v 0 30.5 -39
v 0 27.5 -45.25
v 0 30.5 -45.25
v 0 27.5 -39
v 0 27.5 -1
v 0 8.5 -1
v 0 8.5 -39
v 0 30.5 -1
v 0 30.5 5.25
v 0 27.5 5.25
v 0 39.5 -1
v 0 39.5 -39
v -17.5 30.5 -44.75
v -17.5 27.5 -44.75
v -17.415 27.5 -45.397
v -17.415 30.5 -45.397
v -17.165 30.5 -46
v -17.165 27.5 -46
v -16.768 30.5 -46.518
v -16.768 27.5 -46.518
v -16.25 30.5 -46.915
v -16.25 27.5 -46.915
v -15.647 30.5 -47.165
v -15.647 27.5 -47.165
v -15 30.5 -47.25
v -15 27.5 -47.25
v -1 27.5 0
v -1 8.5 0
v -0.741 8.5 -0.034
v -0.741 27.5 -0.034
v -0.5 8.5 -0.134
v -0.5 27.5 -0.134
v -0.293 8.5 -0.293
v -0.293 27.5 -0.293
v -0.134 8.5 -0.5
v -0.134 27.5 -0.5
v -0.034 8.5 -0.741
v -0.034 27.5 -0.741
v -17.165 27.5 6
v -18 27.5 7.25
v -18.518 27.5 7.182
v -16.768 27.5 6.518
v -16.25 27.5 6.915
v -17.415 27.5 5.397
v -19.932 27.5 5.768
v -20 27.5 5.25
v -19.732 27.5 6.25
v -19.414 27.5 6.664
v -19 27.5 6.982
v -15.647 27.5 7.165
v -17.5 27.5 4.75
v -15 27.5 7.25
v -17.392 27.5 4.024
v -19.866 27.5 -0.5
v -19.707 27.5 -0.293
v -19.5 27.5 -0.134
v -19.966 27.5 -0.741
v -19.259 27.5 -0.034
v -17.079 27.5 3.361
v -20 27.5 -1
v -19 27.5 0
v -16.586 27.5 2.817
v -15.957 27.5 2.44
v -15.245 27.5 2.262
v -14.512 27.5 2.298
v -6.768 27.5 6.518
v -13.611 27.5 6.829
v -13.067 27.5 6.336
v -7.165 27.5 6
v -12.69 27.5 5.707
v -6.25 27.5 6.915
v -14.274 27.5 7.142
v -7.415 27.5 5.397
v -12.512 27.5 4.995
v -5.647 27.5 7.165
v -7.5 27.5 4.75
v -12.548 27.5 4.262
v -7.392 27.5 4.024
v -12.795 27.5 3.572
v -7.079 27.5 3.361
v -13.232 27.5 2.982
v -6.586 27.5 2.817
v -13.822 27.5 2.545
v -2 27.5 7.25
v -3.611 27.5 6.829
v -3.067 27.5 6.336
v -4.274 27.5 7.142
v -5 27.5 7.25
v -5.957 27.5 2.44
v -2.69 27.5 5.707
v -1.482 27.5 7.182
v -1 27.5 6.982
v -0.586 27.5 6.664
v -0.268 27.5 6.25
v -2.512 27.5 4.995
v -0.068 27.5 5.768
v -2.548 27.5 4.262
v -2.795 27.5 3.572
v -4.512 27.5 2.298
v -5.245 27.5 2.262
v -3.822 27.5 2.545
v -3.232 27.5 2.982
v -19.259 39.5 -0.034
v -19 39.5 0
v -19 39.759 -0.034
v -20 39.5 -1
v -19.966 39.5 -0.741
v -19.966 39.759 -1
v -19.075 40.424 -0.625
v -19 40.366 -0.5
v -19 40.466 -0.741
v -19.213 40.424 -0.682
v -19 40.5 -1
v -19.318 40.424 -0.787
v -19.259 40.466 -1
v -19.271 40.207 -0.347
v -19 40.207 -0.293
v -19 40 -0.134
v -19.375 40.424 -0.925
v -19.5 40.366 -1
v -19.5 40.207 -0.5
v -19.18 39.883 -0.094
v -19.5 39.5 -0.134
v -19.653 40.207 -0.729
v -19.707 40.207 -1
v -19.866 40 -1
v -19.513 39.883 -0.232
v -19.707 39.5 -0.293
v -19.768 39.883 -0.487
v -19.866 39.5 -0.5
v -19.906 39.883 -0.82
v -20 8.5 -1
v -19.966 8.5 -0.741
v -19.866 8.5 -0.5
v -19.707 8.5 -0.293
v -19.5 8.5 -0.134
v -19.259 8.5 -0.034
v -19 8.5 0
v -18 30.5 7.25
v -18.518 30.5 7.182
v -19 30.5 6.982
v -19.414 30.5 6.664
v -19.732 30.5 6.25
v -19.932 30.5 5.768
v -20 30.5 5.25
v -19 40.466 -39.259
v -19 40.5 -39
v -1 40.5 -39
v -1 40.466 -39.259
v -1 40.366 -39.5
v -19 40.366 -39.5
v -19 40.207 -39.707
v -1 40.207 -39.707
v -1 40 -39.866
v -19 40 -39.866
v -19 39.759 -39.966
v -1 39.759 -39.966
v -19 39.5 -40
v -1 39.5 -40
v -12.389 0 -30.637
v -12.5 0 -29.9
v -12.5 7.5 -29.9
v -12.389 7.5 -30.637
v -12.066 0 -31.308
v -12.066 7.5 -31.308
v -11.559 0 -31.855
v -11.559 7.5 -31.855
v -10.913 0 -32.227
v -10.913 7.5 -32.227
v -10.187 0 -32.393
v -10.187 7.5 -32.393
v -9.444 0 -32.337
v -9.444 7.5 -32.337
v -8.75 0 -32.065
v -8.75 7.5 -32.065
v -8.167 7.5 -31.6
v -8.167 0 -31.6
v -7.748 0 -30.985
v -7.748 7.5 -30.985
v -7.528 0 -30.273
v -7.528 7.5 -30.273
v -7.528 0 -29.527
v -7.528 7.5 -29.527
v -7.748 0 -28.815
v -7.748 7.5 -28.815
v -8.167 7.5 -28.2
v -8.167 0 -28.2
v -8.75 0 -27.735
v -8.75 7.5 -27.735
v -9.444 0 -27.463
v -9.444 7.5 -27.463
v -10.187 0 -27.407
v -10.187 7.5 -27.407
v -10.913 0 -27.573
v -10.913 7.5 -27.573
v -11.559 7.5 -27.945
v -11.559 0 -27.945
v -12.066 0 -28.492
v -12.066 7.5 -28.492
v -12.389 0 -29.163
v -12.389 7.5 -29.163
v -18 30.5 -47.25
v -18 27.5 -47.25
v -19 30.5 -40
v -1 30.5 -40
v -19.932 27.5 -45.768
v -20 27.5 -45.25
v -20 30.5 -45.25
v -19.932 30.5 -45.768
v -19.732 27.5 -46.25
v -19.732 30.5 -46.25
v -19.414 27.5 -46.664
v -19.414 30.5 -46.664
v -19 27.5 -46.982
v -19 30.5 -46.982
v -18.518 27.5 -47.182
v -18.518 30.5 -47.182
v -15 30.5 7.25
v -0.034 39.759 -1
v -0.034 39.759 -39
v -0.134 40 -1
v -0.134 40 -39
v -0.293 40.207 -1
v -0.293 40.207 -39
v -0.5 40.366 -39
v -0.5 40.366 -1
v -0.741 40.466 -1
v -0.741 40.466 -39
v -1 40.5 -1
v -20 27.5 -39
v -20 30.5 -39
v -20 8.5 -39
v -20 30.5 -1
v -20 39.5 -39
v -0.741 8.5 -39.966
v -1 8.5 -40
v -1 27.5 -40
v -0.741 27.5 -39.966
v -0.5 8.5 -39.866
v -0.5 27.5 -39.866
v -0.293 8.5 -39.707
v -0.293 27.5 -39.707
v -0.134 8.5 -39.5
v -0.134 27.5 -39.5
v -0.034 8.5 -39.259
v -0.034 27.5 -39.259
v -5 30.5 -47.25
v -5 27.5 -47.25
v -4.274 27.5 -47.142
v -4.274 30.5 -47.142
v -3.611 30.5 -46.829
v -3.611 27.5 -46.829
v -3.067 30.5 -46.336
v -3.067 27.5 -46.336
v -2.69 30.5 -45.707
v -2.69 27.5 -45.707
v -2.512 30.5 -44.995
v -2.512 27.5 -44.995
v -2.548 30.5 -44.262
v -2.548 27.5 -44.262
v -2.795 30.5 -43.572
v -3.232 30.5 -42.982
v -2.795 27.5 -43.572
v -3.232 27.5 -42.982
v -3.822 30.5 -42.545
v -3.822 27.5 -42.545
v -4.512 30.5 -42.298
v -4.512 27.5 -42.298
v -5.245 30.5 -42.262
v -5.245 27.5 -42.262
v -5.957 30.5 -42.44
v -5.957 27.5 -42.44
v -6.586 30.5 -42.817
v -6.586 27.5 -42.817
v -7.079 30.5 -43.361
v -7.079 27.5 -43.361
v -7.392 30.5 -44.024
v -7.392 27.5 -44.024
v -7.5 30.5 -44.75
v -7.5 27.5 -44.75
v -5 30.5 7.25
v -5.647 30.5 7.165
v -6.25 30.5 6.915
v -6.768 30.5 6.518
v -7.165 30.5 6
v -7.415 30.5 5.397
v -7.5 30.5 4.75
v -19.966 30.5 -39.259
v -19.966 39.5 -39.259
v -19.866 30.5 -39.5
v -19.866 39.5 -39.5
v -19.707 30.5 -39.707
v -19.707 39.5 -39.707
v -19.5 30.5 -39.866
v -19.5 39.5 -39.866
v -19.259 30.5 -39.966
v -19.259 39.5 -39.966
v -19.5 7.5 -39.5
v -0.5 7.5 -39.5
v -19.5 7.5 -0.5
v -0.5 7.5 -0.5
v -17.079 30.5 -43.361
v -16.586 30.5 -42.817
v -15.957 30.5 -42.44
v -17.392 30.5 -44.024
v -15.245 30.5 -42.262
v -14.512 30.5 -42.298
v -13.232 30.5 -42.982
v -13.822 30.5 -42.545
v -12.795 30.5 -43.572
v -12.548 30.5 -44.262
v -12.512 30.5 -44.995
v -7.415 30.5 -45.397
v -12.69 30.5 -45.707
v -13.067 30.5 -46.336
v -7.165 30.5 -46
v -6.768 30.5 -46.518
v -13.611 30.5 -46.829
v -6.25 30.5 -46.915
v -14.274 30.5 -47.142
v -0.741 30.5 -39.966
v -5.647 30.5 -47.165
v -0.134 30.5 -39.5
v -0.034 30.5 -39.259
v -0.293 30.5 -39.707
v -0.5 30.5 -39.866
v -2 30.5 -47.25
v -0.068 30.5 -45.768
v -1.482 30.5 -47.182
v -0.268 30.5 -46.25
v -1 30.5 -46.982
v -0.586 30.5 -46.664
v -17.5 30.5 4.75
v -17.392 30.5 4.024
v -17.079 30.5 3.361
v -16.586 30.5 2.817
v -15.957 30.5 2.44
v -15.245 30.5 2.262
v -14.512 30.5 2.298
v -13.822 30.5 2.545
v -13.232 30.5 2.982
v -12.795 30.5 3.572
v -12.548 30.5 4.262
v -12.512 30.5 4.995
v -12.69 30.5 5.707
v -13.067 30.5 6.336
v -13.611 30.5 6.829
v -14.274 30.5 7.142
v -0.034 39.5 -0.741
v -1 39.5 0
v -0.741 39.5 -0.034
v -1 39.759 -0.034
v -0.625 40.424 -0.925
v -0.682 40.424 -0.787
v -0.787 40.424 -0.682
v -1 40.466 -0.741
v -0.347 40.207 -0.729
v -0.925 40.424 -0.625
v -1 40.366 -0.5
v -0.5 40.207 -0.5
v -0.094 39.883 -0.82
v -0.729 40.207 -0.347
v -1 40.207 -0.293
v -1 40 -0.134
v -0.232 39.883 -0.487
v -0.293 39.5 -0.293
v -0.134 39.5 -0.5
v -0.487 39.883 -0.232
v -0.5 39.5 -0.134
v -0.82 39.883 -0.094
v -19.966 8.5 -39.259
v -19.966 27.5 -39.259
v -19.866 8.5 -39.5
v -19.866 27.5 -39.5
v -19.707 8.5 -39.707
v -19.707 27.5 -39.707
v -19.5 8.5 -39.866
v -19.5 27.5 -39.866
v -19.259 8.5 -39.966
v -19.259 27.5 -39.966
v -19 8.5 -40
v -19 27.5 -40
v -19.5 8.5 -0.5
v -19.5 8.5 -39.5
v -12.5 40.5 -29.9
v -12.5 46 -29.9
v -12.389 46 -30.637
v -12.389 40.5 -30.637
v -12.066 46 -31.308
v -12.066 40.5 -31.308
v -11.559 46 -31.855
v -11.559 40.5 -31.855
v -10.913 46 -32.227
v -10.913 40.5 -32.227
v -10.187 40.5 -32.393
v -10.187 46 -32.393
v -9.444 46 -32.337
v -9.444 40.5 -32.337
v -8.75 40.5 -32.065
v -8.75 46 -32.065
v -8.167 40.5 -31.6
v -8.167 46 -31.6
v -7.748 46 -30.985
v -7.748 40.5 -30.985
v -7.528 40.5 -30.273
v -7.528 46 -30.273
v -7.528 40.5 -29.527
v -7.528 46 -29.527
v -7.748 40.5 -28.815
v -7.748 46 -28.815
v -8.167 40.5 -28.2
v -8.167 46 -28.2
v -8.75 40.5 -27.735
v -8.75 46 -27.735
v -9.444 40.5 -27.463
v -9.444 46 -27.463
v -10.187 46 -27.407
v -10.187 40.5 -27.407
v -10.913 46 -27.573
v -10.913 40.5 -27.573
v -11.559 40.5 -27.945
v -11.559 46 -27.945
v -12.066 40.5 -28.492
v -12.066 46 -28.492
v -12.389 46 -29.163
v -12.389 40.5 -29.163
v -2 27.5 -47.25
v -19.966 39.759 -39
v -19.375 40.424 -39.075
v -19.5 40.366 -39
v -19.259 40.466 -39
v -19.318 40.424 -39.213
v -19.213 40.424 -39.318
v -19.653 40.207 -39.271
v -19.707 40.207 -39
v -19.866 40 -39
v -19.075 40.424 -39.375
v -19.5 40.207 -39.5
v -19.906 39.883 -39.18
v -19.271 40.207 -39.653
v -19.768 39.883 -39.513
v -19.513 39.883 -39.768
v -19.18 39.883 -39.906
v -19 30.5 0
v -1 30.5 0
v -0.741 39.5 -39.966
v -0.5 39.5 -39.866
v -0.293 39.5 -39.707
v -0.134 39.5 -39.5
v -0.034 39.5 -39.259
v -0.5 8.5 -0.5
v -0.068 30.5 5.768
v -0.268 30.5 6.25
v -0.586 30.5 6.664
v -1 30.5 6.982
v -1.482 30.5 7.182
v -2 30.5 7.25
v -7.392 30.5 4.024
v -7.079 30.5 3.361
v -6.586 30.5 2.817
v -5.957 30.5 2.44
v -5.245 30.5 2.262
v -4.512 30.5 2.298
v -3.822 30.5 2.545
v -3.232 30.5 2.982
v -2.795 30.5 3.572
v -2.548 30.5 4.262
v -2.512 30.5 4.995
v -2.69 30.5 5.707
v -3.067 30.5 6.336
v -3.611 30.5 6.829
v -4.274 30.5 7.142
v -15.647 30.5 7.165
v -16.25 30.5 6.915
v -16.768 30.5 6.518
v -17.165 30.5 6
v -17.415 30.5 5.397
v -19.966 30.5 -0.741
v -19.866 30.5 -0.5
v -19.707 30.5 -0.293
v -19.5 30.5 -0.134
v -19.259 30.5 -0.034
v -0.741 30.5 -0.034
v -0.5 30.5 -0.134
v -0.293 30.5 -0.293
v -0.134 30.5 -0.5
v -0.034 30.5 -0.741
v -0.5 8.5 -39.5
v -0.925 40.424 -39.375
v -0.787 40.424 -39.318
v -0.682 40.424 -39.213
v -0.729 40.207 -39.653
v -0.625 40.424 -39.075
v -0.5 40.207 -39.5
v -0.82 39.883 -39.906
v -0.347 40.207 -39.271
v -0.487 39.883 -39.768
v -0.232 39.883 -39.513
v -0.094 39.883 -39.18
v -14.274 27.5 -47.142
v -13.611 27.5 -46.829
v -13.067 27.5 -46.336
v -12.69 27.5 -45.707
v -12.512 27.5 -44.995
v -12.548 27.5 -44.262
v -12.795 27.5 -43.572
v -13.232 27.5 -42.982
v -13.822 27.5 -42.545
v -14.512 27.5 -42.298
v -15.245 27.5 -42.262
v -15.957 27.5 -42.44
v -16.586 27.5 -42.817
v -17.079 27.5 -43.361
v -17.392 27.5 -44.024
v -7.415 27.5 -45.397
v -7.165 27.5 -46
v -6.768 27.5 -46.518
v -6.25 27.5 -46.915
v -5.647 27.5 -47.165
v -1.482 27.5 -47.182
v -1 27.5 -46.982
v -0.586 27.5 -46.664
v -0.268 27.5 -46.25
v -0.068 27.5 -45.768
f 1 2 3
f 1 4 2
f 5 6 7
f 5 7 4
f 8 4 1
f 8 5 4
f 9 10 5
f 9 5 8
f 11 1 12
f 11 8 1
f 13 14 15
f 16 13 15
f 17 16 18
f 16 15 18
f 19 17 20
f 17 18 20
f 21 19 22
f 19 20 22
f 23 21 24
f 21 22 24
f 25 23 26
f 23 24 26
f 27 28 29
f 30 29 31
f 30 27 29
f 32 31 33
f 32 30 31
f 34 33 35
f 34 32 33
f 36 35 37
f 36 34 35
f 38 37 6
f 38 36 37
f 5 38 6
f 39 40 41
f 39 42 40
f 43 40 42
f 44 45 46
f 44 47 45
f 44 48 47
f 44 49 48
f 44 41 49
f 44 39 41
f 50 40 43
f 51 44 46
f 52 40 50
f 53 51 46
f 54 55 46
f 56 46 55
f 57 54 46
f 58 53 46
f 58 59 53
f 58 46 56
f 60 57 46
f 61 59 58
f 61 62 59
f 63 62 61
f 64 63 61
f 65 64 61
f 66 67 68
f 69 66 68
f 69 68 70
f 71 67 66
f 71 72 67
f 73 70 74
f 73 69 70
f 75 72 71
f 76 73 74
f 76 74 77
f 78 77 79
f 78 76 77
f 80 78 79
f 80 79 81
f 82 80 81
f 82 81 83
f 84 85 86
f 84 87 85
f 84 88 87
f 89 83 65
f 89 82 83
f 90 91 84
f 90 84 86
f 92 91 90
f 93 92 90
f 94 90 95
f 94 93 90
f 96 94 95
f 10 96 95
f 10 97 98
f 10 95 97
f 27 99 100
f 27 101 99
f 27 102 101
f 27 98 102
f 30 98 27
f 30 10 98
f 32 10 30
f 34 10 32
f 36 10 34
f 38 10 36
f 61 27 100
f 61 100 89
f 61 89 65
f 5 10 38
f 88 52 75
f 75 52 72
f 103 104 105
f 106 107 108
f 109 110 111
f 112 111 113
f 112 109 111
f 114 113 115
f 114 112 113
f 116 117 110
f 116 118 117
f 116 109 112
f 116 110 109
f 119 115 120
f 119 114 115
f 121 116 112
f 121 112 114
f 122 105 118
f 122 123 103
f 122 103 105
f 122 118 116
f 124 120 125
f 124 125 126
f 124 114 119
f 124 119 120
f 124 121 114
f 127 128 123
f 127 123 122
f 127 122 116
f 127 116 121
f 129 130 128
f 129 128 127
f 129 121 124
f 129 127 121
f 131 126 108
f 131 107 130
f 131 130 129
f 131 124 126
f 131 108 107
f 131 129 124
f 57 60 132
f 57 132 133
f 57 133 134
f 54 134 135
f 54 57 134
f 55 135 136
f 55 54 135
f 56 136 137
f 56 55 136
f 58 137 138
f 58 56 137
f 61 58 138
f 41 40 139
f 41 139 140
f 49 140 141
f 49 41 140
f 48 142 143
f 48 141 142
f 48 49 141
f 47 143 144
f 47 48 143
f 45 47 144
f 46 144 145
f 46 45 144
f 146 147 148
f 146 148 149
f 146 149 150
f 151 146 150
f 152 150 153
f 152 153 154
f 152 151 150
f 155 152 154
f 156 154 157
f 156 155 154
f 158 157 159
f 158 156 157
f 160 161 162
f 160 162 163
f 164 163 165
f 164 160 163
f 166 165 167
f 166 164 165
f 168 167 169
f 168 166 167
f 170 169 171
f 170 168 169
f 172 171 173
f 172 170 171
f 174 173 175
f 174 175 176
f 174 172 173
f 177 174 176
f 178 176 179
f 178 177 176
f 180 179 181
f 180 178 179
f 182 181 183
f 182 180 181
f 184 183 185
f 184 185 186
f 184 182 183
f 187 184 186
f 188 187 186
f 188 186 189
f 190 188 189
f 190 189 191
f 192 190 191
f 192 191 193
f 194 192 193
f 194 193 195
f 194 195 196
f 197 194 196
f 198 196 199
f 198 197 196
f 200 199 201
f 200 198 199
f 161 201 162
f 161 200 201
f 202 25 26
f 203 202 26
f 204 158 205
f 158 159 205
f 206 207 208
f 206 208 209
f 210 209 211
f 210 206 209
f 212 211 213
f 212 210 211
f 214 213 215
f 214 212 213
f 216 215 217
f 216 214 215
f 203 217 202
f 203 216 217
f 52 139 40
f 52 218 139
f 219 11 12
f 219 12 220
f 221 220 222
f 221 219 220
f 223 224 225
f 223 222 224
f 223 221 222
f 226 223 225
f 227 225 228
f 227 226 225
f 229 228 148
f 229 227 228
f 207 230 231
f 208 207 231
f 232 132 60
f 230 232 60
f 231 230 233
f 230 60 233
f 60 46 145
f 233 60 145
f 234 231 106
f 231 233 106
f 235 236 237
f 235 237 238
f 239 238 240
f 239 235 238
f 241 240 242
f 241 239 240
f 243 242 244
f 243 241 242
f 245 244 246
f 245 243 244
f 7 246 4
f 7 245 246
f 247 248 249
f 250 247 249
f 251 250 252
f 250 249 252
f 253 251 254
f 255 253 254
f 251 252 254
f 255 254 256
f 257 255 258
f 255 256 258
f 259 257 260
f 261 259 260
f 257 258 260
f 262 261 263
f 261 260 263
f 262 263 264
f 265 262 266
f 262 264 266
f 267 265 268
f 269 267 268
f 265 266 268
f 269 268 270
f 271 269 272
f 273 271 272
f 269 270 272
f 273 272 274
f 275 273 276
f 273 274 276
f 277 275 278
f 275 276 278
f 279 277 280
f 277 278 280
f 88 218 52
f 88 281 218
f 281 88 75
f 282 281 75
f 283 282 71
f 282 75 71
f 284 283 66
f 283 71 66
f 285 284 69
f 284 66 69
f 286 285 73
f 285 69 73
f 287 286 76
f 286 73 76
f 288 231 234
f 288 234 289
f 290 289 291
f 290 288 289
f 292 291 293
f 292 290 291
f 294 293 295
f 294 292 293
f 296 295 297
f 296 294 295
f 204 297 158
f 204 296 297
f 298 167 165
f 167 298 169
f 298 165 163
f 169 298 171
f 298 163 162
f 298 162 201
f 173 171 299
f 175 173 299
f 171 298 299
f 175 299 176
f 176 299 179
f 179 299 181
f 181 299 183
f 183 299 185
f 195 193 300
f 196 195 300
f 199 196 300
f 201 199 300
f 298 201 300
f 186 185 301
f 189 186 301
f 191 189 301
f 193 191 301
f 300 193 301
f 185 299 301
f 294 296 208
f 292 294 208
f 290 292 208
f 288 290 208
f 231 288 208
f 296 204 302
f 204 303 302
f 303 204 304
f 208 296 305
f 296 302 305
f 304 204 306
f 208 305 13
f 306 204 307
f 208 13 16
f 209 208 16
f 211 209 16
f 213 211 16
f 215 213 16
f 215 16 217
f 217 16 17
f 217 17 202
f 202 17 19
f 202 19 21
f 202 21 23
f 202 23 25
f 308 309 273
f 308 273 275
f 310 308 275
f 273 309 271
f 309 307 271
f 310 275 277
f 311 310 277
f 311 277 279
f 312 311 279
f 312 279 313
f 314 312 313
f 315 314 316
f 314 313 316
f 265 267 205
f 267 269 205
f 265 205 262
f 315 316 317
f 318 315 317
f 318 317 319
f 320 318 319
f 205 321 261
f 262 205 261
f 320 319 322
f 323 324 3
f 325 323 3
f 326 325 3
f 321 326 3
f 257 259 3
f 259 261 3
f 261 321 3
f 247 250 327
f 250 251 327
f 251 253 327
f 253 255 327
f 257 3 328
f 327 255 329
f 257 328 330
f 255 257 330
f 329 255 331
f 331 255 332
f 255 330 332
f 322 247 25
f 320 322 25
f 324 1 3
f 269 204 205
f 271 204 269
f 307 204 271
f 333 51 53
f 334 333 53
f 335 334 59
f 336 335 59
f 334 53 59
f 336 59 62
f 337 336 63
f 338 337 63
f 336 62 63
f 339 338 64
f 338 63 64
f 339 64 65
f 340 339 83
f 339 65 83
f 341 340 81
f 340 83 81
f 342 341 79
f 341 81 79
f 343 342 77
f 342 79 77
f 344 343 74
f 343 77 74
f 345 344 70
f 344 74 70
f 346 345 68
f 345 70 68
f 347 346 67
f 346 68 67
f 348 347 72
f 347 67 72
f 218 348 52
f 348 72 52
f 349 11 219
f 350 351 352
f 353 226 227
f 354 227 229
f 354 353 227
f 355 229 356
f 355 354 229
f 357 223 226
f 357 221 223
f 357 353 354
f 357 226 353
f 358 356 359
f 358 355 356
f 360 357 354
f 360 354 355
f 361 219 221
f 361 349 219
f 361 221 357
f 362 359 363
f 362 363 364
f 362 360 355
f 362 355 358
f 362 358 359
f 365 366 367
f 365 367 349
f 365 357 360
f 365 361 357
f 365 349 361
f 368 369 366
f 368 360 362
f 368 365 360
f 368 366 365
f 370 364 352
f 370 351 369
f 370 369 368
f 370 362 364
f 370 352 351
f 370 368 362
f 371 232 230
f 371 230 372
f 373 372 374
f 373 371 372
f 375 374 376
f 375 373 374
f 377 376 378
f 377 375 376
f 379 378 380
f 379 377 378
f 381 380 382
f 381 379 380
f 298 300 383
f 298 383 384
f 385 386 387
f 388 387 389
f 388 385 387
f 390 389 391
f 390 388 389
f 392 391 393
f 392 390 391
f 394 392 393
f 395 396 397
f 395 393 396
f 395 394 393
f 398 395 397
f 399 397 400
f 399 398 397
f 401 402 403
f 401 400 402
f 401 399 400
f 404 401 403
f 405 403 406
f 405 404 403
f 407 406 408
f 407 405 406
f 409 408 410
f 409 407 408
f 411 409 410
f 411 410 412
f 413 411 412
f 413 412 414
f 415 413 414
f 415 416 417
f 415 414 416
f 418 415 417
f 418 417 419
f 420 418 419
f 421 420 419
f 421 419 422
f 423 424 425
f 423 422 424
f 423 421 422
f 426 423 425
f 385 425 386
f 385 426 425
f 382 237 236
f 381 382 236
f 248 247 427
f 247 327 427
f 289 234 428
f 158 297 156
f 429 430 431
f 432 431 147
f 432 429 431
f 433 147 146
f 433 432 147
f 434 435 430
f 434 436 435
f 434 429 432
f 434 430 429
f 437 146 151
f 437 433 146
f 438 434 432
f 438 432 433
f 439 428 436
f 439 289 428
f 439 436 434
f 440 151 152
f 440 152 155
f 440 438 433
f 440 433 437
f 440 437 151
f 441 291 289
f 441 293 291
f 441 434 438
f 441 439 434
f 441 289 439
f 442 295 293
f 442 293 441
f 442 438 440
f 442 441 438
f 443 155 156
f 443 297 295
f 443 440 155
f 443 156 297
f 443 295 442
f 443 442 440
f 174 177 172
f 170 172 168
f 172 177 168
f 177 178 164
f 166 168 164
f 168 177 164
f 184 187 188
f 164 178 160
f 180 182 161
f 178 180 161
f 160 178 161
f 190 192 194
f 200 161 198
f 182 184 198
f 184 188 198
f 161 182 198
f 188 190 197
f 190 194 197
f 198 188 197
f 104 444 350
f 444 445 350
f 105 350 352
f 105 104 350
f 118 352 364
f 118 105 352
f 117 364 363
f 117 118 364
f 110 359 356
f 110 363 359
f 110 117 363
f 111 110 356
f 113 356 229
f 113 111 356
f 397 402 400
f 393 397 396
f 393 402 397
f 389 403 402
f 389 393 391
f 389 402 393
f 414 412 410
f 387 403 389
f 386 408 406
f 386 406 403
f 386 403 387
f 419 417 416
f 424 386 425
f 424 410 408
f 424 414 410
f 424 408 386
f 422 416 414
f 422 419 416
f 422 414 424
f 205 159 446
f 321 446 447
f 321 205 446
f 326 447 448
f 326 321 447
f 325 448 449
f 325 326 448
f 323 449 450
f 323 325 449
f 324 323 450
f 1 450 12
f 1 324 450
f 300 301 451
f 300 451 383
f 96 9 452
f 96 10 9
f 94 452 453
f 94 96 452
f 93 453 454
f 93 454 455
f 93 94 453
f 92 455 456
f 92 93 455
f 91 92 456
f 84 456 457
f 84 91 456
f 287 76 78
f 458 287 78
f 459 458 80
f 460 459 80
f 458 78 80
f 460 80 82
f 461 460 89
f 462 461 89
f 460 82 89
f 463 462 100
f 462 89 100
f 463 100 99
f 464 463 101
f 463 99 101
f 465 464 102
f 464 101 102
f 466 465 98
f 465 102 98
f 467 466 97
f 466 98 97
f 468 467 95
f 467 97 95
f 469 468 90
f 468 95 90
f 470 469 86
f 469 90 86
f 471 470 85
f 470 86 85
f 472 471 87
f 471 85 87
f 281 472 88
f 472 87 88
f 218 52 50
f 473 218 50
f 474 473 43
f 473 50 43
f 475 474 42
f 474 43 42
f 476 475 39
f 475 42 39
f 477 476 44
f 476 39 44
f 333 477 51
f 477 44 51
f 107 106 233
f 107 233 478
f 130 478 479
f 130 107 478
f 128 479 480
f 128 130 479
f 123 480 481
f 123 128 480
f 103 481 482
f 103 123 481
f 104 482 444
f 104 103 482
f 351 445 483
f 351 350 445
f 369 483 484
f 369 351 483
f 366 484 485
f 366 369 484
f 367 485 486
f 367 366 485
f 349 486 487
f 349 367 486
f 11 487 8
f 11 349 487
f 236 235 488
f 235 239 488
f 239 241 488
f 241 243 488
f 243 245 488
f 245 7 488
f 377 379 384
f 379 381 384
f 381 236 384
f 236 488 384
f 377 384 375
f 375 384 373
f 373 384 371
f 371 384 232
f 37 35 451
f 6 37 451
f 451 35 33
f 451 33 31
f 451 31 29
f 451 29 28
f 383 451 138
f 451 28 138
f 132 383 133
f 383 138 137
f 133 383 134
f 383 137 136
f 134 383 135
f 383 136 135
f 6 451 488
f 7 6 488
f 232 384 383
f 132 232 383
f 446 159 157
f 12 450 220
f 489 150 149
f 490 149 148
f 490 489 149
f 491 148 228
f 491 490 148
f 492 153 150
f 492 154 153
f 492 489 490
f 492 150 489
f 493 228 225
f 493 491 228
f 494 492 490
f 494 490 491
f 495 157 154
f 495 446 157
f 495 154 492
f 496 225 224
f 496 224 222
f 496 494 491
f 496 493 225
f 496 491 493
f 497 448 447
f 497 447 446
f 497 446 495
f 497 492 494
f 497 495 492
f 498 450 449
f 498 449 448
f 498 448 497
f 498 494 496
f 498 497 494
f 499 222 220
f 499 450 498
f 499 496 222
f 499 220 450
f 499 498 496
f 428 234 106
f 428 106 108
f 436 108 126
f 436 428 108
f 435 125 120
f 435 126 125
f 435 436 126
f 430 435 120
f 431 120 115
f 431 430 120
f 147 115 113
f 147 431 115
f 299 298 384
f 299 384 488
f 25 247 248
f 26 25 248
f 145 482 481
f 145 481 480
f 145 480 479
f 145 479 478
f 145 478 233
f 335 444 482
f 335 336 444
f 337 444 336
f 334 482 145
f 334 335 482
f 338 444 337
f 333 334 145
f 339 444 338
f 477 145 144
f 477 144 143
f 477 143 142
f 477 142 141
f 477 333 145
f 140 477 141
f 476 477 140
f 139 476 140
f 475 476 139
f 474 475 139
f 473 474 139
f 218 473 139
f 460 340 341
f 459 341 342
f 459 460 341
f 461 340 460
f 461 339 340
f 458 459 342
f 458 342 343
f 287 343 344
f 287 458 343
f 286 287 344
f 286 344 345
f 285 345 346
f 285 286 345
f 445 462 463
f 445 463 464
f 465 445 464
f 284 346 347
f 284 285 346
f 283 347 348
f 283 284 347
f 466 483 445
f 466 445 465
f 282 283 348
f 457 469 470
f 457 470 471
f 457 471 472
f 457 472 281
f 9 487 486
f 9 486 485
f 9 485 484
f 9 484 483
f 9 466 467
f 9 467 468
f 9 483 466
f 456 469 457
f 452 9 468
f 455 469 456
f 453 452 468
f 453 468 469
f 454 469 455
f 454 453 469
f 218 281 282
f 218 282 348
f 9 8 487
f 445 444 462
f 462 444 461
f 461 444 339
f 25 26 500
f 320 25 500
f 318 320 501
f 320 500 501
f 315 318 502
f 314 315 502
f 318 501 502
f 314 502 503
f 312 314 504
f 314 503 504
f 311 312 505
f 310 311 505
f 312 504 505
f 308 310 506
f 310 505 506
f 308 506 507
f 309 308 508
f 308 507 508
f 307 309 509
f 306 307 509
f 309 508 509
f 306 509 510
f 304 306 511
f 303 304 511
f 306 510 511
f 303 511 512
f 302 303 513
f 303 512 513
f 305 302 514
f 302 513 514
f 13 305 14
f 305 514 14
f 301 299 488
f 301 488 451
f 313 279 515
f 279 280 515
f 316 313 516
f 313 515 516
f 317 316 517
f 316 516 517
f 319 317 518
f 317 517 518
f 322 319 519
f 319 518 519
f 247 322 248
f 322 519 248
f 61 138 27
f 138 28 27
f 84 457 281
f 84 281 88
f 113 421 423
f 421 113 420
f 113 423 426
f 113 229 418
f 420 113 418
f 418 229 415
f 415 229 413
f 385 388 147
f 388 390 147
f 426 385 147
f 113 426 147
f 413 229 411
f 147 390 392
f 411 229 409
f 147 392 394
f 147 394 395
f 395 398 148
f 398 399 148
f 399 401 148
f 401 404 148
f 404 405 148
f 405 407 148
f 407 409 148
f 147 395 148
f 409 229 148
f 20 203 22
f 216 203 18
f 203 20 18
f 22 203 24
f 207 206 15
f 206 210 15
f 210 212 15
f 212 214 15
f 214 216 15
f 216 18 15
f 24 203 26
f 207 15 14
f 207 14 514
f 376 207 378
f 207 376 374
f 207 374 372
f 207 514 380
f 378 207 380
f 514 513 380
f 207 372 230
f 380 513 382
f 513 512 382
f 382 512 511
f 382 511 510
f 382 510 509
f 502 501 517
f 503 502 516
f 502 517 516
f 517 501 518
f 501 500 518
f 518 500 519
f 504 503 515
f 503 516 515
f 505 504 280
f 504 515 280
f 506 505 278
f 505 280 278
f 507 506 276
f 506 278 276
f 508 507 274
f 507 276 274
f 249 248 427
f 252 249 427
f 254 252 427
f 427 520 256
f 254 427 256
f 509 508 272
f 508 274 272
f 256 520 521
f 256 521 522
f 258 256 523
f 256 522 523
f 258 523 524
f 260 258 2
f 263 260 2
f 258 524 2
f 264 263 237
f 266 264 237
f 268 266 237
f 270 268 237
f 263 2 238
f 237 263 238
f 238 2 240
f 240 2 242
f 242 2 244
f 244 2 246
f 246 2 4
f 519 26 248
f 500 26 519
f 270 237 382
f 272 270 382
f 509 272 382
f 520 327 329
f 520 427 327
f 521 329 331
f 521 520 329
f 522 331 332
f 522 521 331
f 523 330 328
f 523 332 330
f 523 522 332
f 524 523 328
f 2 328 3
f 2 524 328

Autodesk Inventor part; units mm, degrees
ref_plane "YZ Plane" through (0, 0, 0) normal (1, 0, 0) x (0, 1, 0)
ref_plane "XZ Plane" through (0, 0, 0) normal (0, 1, 0) x (-1, 0, 0)
ref_plane "XY Plane" through (0, 0, 0) normal (0, 0, 1) x (1, 0, 0)
sketch "Sketch1" plane through (0, 0, 0) normal (1, 0, 0) x (0, 1, 0)
  line L0 (0, 0) -> (40.5, 0)
  line L1 (40.5, 0) -> (40.5, -40)
  line L2 (40.5, -40) -> (0, -40)
  line L3 (0, -40) -> (0, 0)
  line L4 (46, -27.4) -> (40.5, -27.4)
  line L5 (40.5, -27.4) -> (40.5, -32.4)
  line L6 (40.5, -32.4) -> (46, -32.4)
  line L7 (46, -32.4) -> (46, -27.4)
  line L8 (46, -27.4) -> (40.5, -32.4) construction
  line L9 (40.5, -27.4) -> (46, -32.4) construction
  line L10 (40.5, -20) -> (0, -20) construction
  line L11 (27.5, 0) -> (30.5, 0)
  line L12 (30.5, 0) -> (30.5, 7.25)
  line L13 (30.5, 7.25) -> (27.5, 7.25)
  line L14 (27.5, 7.25) -> (27.5, 0)
  line L15 (27.5, -40) -> (30.5, -40)
  line L16 (30.5, -40) -> (30.5, -47.25)
  line L17 (30.5, -47.25) -> (27.5, -47.25)
  line L18 (27.5, -47.25) -> (27.5, -40)
  line L19 (3, -40) -> (6.5, -40)
  line L20 (6.5, -40) -> (6.5, -45.5)
  line L21 (6.5, -45.5) -> (3, -45.5)
  line L22 (3, -45.5) -> (3, -40)
  line L23 (0, -40) -> (7.5, -40)
  line L24 (7.5, -40) -> (7.5, 0)
  line L25 (7.5, 0) -> (0, 0)
  line L26 (0, 0) -> (0, -40)
  point P0 (43.25, -29.9)
  point P1 (30.5, 0)
  dimension "d0" = 40
  dimension "d1" = 40.5
  dimension "d2" = 10.1
  dimension "d3" = 5.5
  dimension "d4" = 5
  dimension "d5" = 20
  dimension "d6" = 3
  dimension "d7" = 27.5
  dimension "d8" = 7.25
  dimension "d31" = 3.5
  dimension "d32" = 5.5
  dimension "d33" = 21
  dimension "d34" = 3
  dimension "d41" = 3
  dimension "d42" = 20
  dimension "d43" = 7.5
sketch "Sketch2" plane through (0, 0, 0) normal (0, 1, 0) x (-1, 0, 0)
  line L0 (0, 0) -> (20, 0)
  line L1 (20, 0) -> (20, -40)
  line L2 (20, -40) -> (0, -40)
  line L3 (0, -40) -> (0, 0)
  line L4 (0, 0) -> (20, 0)
  line L5 (20, 0) -> (20, 7.25)
  line L6 (20, 7.25) -> (0, 7.25)
  line L7 (0, 7.25) -> (0, 0)
  circle A0 centre (5, 4.75) radius 2.5
  line L8 (10, 7.25) -> (10, 0) construction
  circle A1 centre (15, 4.75) radius 2.5
  line L9 (20, -20) -> (0, -20) construction
  line L10 (20, -40) -> (20, -47.25)
  line L11 (20, -47.25) -> (0, -47.25)
  line L12 (0, -47.25) -> (0, -40)
  circle A2 centre (5, -44.75) radius 2.5
  circle A3 centre (15, -44.75) radius 2.5
  circle A4 centre (10, -29.9) radius 2.5
  line L13 (0, -0.5) -> (19.5, -0.5)
  line L14 (19.5, -0.5) -> (19.5, -39.5)
  line L15 (19.5, -39.5) -> (0, -39.5)
  line L16 (0.5, -40) -> (0.5, 0)
  point P0 (0.5, -0.5)
  point P1 (0.5, -39.5)
  dimension "d9" = 40
  dimension "d10" = 20
  dimension "d11" = 7.25
  dimension "d12" = 20
  dimension "d13" = 5
  dimension "d14" = 5
  dimension "d15" = 2.5
  dimension "d16" = 5
  dimension "d17" = 10.1
  dimension "d18" = 10
  dimension "d19" = 14.85
  dimension "d20" = 34.65
  dimension "d21" = 54.5
  dimension "d30" = 49.5
  dimension "d44" = 0.5
  dimension "d45" = 0.5
extrude "Extrusion1" add sketch "Sketch1" against normal blind 20 contours L0 L1 L2 L24 | L14 L13 L12 L0 | L2 L16 L17 L18
extrude "Extrusion2" cut sketch "Sketch2" along normal blind 100 contours A1 | A0 | A2 | A3
extrude "Extrusion3" add sketch "Sketch2" along normal blind 46 contours A4
fillet "Fillet1" radius 2 4 edges at (-20, 29, 7.25) (0, 29, 7.25) (0, 29, -47.25) (-20, 29, -47.25)
fillet "Fillet2" radius 1 12 edges at (0, 17.5, 0) (0, 35.5, 0) (0, 35.5, -40) (0, 17.5, -40) (-20, 35.5, -40) (-20, 17.5, -40) (-20, 35.5, 0) (-20, 17.5, 0) (-20, 40.5, -20) (-10, 40.5, 0) (0, 40.5, -20) (-10, 40.5, -40)
extrude "Extrusion5" cut sketch "Sketch2" along normal blind 8.5 contours L0 L16 L13 L3 | L0 L1 L2 L16 L15 L14 L13 | L13 L16 L15 L3 | L15 L16 L2 L3
properties part number "Servo40KgRough"
